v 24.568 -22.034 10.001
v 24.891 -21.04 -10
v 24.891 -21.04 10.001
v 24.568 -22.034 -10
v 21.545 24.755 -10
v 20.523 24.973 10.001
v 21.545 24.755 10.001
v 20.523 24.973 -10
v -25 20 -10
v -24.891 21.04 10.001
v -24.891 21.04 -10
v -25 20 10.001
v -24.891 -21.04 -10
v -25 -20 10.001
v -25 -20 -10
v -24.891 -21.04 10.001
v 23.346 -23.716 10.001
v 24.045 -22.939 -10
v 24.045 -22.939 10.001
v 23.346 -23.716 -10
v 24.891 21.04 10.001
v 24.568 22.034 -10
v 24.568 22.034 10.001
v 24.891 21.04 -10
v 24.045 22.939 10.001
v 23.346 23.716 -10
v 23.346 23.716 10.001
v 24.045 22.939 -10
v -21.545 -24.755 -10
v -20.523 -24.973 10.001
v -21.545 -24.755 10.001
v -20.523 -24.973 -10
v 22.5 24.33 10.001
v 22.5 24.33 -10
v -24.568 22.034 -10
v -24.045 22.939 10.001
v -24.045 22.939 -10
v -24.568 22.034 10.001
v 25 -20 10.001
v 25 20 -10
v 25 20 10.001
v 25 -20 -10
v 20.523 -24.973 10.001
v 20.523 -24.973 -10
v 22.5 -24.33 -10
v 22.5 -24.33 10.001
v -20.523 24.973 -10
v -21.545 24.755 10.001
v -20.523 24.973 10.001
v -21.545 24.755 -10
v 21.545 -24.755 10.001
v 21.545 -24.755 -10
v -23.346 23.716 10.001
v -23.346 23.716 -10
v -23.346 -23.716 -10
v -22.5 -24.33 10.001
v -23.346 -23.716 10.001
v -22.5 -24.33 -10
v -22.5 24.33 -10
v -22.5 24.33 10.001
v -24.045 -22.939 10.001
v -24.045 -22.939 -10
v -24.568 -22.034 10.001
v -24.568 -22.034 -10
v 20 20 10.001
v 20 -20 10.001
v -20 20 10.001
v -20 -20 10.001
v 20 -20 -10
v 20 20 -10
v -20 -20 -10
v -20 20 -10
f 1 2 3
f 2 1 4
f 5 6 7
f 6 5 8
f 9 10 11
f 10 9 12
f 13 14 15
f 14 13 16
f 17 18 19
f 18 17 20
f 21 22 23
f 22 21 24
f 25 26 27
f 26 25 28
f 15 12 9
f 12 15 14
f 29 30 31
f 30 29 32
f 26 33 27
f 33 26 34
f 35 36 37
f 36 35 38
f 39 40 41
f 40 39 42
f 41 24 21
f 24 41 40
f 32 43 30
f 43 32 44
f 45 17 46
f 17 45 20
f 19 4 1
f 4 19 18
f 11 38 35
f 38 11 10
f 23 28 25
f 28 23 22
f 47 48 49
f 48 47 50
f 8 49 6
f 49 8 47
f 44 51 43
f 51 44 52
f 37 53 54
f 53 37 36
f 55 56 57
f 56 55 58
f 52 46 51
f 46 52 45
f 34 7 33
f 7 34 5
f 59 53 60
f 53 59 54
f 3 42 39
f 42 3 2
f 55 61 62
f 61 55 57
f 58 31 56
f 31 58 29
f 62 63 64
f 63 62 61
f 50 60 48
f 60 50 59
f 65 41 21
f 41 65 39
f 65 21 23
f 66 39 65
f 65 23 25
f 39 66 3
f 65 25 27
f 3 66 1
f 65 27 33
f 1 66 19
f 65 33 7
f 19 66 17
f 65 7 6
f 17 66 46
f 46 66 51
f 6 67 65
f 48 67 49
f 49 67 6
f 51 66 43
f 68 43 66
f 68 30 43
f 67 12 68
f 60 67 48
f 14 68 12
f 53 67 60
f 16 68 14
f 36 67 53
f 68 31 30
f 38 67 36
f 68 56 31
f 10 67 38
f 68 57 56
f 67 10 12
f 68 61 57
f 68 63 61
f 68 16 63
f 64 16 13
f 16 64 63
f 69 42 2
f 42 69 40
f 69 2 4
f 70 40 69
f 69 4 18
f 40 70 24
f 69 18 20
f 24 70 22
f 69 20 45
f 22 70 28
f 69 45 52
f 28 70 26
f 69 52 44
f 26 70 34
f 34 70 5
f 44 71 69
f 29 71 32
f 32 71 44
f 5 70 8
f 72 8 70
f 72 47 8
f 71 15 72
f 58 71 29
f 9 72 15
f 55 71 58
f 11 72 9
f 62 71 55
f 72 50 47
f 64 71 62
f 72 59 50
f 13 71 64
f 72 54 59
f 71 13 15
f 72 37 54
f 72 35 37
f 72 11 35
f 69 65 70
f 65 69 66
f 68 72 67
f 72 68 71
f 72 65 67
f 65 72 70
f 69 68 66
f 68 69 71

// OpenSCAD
difference(){
    minkowski(){
        cube(size = [40,40,20],center = true);
        cylinder(r = 5, h=0.001, $fn = 30);
    }
    cube(size = [40,40,40], center = true);
}
    
